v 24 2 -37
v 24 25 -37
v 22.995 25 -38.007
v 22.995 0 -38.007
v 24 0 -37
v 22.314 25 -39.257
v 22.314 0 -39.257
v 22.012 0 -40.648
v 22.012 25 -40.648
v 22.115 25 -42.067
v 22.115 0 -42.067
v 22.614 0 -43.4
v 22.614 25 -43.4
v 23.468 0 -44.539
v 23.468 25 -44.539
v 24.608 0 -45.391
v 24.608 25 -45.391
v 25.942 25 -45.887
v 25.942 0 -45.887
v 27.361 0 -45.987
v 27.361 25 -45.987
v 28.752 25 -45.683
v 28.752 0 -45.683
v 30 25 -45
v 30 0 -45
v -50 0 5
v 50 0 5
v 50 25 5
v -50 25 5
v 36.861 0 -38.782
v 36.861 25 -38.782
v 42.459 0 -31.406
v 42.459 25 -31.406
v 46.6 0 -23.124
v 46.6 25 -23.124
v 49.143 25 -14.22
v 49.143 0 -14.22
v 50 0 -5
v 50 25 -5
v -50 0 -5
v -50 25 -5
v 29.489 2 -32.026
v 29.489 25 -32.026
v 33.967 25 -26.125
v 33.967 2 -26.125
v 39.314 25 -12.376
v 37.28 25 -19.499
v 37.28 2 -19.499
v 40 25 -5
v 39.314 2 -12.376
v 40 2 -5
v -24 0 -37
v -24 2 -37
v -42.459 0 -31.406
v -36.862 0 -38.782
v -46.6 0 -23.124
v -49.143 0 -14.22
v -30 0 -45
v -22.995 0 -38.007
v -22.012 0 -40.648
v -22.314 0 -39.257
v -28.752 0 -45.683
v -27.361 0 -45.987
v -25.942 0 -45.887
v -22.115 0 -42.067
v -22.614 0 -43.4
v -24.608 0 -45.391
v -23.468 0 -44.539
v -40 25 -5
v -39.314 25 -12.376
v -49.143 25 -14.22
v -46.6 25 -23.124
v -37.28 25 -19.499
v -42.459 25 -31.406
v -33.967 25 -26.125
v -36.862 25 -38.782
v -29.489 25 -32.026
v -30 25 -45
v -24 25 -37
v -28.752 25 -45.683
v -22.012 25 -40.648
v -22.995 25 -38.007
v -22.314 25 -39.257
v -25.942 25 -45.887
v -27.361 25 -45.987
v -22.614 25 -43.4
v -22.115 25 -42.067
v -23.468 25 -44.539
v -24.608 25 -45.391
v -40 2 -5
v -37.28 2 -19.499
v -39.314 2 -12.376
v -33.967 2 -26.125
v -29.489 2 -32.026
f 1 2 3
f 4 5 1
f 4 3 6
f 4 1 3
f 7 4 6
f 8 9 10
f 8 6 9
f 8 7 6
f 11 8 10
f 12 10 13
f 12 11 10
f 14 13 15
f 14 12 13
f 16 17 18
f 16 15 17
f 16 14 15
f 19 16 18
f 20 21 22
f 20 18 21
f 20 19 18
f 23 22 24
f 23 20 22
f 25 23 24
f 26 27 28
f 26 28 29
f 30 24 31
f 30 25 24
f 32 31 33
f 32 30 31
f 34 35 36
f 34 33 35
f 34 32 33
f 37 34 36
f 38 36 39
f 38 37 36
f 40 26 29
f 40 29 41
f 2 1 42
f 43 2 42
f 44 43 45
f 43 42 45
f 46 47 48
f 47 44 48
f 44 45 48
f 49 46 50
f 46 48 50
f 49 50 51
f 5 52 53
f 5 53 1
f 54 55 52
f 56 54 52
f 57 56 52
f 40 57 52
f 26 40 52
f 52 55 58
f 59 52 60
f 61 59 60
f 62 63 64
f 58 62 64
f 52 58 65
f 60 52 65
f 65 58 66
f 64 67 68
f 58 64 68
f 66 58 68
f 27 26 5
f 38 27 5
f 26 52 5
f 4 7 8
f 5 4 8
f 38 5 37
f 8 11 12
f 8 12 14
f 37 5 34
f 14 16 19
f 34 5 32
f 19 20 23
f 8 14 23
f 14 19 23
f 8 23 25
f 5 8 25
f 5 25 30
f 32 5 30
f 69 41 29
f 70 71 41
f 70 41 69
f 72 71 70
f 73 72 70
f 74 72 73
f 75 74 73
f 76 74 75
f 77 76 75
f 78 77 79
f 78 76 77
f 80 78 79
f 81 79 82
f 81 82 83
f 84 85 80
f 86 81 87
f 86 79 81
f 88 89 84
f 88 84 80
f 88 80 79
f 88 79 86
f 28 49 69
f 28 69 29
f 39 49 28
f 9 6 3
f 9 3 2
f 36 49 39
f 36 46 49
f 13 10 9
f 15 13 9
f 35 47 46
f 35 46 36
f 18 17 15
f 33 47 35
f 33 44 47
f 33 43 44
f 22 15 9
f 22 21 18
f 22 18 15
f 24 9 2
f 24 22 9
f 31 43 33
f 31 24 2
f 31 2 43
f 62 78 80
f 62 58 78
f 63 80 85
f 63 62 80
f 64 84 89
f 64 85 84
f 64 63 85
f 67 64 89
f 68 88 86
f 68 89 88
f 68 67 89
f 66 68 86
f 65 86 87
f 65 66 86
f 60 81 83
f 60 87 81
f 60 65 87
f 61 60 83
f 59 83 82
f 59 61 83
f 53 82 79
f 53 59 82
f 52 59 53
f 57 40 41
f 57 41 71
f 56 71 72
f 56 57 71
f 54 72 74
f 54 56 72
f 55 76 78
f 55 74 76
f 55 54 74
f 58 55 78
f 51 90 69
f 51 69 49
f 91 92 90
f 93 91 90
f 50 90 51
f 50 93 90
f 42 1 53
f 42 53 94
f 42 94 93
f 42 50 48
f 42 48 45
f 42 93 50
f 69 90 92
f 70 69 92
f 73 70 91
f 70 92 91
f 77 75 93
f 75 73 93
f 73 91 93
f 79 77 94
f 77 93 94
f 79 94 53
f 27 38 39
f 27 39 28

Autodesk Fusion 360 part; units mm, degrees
sketch "Sketch1" plane through (0, 0, 0) normal (0, 1, 0) x (1, 0, 0)
  line L0 (50, 5) -> (50, -5)
  line L1 (50, -5) -> (-50, -5)
  line L2 (-50, -5) -> (-50, 5)
  line L3 (0, 5) -> (0, -20)
  line L4 (-50, 5) -> (-40, 5)
  line L5 (-40, 5) -> (0, 5)
  line L6 (40, 5) -> (50, 5)
  line L7 (0, 5) -> (40, 5)
  arc A0 (50, 5) -> (30, 45) centre (0, 5) ccw
  arc A1 (-30.0001, 45) -> (-50, 5) centre (0, 5) ccw
  arc A2 (40, 5) -> (24, 37) centre (0, 5) ccw
  arc A3 (-24, 37) -> (-40, 5) centre (0, 5) ccw
  arc A4 (-24, 37) -> (-30.0001, 45) centre (-27, 41) ccw
  line L8 (-24, 37) -> (24, 37)
  arc A5 (30, 45) -> (24, 37) centre (27, 41) ccw
  dimension "d1" = 10
  dimension "d2" = 100
  dimension "d6" = 10
  dimension "d7" = 10
  dimension "d8" = 50
  dimension "d9" = 50
  dimension "d10" = 10
extrude "Extrude1" add sketch "Sketch1" along normal blind 2 contours L5 L7 A2 A3 L8
extrude "Extrude2" add sketch "Sketch1" along normal blind 50 contours L0 L1 L3 L6 L7 | L6 A0 A2 A5 | L1 L2 L3 L4 L5 | L4 A1 A3 A4
extrude "Extrude3" cut 1 faces at (0, 50, 1.6667) along direction (0, -1, 0) blind 25
equation "d7 = d6"
equation "d10 = d6"
